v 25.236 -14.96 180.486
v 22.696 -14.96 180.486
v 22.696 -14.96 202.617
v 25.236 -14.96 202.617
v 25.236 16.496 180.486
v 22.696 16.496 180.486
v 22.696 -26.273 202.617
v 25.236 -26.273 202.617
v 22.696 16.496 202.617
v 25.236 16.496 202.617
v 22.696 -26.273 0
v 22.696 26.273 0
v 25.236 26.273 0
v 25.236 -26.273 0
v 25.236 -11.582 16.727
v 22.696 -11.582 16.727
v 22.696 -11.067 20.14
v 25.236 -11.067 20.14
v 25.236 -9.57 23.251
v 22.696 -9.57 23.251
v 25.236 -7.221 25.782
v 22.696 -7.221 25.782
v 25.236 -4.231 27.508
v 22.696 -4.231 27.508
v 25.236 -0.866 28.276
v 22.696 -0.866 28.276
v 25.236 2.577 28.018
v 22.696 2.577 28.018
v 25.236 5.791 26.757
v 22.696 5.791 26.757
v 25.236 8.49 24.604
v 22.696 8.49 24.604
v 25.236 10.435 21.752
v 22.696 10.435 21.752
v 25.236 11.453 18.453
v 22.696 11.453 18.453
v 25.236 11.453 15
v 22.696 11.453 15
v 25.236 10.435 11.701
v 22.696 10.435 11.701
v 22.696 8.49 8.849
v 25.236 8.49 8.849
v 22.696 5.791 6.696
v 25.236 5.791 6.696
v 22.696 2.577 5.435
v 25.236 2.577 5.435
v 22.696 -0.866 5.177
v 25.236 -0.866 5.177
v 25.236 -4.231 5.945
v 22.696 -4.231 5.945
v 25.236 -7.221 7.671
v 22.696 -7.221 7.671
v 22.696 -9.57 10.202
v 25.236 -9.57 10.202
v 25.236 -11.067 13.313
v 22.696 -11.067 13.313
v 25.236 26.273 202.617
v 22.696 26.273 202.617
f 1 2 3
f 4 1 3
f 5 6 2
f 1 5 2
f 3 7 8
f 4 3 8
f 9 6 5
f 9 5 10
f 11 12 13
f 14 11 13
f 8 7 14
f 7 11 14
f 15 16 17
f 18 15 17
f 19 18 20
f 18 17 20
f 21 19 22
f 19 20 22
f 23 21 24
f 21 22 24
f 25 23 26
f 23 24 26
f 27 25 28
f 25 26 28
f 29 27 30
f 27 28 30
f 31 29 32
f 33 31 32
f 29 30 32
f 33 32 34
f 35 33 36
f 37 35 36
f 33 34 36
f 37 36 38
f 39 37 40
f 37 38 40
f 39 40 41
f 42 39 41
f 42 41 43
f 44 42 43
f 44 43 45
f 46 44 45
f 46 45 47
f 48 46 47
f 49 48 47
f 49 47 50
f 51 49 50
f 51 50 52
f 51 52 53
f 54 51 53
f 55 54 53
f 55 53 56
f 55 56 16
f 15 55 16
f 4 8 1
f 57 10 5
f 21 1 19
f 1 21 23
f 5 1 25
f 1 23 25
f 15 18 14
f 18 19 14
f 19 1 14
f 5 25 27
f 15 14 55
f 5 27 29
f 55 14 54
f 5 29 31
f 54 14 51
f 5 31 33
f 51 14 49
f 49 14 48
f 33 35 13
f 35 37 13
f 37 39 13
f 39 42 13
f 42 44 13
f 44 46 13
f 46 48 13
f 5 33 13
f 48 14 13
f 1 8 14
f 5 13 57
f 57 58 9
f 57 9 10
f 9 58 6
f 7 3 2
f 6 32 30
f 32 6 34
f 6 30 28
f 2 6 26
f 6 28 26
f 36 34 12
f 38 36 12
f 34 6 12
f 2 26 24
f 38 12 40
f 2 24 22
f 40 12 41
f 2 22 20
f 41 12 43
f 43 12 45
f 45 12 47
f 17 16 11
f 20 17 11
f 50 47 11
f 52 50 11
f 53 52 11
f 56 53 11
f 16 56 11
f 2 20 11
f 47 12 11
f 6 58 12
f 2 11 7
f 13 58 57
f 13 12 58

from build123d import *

# Parameters (mm, degrees)
F0_W      = 50.4710152745
F0_H      = 52.5459498167
F1_DEPTH  = 128.1304806471
F2_T      = -2.54
F4_DEPTH  = 87.9370719194
F5_DEPTH  = 92.566229403
F6_DEPTH  = 25.4
F7_DEPTH  = 25.4
F8_DEPTH  = 25.4
F9_DEPTH  = 74.4861587882
F10_W     = 31.4560076222
F10_H     = 22.1310183406
F11_DEPTH = 25.4
F12_R     = 11.5820249722
F13_DEPTH = 25.4


with BuildPart() as f1:
    # F0 (on Top) → F1 (new body)
    with BuildSketch(Plane.XY):
        Rectangle(F0_W, F0_H)
    extrude(amount=F1_DEPTH)

    # F2
    f2_openings = [f1.faces().sort_by_distance(p)[0] for p in [
        (0, 0, 128.130481),
    ]]
    offset(amount=F2_T, openings=f2_openings)

    # F3 (on face) → F4 (cut)
    with BuildSketch(Plane.XZ.offset(26.2729749084)):
        with BuildLine():
            add(Edge.make_bspline(
                [(0, 13.7362796813), (7.3372486719, 13.7362796813), (3.6686243359, 97.3400166258), (0, 180.9437535703), (-3.6686243359, 97.3400166258), (-7.3372486719, 13.7362796813), (0, 13.7362796813)],
                knots=[0, 0, 0, 2.0943951024, 2.0943951024, 4.1887902048, 4.1887902048, 6.2831853072, 6.2831853072, 6.2831853072], degree=2, weights=[1, 0.5, 1, 0.5, 1, 0.5, 1]))
        make_face()
    extrude(amount=-F4_DEPTH, mode=Mode.SUBTRACT)

    # F5 (cut): a face of the model
    f5_faces = [f1.faces().sort_by_distance(p)[0] for p in [
        (0, 23.7329749084, 126.7950663606),
    ]]
    extrude(f5_faces, amount=F5_DEPTH, mode=Mode.SUBTRACT)

    # F6 (cut): a face of the model
    f6_faces = [f1.faces().sort_by_distance(p)[0] for p in [
        (0, 23.7329749084, 126.7950663606),
    ]]
    extrude(f6_faces, amount=-F6_DEPTH, mode=Mode.SUBTRACT)

    # F7 (cut): a face of the model
    f7_faces = [f1.faces().sort_by_distance(p)[0] for p in [
        (0, 0, 2.54),
    ]]
    extrude(f7_faces, amount=-F7_DEPTH, mode=Mode.SUBTRACT)

    # F8 (cut): a face of the model
    f8_faces = [f1.faces().sort_by_distance(p)[0] for p in [
        (-22.6955076373, 0, 64.0652403235),
    ]]
    extrude(f8_faces, amount=-F8_DEPTH, mode=Mode.SUBTRACT)

    # F9 (add): a face of the model
    f9_faces = [f1.faces().sort_by_distance(p)[0] for p in [
        (23.9655076373, 0, 128.1304806471),
    ]]
    extrude(f9_faces, amount=F9_DEPTH)

    # F10 (on face) → F11 (cut)
    with BuildSketch(Plane(origin=(22.6955076373, 0, 0), x_dir=(0, -1, 0), z_dir=(-1, 0, 0))):
        with Locations((-0.7681553252, 191.551130265)):
            Rectangle(F10_W, F10_H)
    extrude(amount=-F11_DEPTH, mode=Mode.SUBTRACT)

    # F12 (on face) → F13 (cut)
    with BuildSketch(Plane(origin=(22.6955076373, 0, 0), x_dir=(0, -1, 0), z_dir=(-1, 0, 0))):
        with Locations((0, 16.72661677)):
            Circle(F12_R)
    extrude(amount=-F13_DEPTH, mode=Mode.SUBTRACT)


solid = f1.part
